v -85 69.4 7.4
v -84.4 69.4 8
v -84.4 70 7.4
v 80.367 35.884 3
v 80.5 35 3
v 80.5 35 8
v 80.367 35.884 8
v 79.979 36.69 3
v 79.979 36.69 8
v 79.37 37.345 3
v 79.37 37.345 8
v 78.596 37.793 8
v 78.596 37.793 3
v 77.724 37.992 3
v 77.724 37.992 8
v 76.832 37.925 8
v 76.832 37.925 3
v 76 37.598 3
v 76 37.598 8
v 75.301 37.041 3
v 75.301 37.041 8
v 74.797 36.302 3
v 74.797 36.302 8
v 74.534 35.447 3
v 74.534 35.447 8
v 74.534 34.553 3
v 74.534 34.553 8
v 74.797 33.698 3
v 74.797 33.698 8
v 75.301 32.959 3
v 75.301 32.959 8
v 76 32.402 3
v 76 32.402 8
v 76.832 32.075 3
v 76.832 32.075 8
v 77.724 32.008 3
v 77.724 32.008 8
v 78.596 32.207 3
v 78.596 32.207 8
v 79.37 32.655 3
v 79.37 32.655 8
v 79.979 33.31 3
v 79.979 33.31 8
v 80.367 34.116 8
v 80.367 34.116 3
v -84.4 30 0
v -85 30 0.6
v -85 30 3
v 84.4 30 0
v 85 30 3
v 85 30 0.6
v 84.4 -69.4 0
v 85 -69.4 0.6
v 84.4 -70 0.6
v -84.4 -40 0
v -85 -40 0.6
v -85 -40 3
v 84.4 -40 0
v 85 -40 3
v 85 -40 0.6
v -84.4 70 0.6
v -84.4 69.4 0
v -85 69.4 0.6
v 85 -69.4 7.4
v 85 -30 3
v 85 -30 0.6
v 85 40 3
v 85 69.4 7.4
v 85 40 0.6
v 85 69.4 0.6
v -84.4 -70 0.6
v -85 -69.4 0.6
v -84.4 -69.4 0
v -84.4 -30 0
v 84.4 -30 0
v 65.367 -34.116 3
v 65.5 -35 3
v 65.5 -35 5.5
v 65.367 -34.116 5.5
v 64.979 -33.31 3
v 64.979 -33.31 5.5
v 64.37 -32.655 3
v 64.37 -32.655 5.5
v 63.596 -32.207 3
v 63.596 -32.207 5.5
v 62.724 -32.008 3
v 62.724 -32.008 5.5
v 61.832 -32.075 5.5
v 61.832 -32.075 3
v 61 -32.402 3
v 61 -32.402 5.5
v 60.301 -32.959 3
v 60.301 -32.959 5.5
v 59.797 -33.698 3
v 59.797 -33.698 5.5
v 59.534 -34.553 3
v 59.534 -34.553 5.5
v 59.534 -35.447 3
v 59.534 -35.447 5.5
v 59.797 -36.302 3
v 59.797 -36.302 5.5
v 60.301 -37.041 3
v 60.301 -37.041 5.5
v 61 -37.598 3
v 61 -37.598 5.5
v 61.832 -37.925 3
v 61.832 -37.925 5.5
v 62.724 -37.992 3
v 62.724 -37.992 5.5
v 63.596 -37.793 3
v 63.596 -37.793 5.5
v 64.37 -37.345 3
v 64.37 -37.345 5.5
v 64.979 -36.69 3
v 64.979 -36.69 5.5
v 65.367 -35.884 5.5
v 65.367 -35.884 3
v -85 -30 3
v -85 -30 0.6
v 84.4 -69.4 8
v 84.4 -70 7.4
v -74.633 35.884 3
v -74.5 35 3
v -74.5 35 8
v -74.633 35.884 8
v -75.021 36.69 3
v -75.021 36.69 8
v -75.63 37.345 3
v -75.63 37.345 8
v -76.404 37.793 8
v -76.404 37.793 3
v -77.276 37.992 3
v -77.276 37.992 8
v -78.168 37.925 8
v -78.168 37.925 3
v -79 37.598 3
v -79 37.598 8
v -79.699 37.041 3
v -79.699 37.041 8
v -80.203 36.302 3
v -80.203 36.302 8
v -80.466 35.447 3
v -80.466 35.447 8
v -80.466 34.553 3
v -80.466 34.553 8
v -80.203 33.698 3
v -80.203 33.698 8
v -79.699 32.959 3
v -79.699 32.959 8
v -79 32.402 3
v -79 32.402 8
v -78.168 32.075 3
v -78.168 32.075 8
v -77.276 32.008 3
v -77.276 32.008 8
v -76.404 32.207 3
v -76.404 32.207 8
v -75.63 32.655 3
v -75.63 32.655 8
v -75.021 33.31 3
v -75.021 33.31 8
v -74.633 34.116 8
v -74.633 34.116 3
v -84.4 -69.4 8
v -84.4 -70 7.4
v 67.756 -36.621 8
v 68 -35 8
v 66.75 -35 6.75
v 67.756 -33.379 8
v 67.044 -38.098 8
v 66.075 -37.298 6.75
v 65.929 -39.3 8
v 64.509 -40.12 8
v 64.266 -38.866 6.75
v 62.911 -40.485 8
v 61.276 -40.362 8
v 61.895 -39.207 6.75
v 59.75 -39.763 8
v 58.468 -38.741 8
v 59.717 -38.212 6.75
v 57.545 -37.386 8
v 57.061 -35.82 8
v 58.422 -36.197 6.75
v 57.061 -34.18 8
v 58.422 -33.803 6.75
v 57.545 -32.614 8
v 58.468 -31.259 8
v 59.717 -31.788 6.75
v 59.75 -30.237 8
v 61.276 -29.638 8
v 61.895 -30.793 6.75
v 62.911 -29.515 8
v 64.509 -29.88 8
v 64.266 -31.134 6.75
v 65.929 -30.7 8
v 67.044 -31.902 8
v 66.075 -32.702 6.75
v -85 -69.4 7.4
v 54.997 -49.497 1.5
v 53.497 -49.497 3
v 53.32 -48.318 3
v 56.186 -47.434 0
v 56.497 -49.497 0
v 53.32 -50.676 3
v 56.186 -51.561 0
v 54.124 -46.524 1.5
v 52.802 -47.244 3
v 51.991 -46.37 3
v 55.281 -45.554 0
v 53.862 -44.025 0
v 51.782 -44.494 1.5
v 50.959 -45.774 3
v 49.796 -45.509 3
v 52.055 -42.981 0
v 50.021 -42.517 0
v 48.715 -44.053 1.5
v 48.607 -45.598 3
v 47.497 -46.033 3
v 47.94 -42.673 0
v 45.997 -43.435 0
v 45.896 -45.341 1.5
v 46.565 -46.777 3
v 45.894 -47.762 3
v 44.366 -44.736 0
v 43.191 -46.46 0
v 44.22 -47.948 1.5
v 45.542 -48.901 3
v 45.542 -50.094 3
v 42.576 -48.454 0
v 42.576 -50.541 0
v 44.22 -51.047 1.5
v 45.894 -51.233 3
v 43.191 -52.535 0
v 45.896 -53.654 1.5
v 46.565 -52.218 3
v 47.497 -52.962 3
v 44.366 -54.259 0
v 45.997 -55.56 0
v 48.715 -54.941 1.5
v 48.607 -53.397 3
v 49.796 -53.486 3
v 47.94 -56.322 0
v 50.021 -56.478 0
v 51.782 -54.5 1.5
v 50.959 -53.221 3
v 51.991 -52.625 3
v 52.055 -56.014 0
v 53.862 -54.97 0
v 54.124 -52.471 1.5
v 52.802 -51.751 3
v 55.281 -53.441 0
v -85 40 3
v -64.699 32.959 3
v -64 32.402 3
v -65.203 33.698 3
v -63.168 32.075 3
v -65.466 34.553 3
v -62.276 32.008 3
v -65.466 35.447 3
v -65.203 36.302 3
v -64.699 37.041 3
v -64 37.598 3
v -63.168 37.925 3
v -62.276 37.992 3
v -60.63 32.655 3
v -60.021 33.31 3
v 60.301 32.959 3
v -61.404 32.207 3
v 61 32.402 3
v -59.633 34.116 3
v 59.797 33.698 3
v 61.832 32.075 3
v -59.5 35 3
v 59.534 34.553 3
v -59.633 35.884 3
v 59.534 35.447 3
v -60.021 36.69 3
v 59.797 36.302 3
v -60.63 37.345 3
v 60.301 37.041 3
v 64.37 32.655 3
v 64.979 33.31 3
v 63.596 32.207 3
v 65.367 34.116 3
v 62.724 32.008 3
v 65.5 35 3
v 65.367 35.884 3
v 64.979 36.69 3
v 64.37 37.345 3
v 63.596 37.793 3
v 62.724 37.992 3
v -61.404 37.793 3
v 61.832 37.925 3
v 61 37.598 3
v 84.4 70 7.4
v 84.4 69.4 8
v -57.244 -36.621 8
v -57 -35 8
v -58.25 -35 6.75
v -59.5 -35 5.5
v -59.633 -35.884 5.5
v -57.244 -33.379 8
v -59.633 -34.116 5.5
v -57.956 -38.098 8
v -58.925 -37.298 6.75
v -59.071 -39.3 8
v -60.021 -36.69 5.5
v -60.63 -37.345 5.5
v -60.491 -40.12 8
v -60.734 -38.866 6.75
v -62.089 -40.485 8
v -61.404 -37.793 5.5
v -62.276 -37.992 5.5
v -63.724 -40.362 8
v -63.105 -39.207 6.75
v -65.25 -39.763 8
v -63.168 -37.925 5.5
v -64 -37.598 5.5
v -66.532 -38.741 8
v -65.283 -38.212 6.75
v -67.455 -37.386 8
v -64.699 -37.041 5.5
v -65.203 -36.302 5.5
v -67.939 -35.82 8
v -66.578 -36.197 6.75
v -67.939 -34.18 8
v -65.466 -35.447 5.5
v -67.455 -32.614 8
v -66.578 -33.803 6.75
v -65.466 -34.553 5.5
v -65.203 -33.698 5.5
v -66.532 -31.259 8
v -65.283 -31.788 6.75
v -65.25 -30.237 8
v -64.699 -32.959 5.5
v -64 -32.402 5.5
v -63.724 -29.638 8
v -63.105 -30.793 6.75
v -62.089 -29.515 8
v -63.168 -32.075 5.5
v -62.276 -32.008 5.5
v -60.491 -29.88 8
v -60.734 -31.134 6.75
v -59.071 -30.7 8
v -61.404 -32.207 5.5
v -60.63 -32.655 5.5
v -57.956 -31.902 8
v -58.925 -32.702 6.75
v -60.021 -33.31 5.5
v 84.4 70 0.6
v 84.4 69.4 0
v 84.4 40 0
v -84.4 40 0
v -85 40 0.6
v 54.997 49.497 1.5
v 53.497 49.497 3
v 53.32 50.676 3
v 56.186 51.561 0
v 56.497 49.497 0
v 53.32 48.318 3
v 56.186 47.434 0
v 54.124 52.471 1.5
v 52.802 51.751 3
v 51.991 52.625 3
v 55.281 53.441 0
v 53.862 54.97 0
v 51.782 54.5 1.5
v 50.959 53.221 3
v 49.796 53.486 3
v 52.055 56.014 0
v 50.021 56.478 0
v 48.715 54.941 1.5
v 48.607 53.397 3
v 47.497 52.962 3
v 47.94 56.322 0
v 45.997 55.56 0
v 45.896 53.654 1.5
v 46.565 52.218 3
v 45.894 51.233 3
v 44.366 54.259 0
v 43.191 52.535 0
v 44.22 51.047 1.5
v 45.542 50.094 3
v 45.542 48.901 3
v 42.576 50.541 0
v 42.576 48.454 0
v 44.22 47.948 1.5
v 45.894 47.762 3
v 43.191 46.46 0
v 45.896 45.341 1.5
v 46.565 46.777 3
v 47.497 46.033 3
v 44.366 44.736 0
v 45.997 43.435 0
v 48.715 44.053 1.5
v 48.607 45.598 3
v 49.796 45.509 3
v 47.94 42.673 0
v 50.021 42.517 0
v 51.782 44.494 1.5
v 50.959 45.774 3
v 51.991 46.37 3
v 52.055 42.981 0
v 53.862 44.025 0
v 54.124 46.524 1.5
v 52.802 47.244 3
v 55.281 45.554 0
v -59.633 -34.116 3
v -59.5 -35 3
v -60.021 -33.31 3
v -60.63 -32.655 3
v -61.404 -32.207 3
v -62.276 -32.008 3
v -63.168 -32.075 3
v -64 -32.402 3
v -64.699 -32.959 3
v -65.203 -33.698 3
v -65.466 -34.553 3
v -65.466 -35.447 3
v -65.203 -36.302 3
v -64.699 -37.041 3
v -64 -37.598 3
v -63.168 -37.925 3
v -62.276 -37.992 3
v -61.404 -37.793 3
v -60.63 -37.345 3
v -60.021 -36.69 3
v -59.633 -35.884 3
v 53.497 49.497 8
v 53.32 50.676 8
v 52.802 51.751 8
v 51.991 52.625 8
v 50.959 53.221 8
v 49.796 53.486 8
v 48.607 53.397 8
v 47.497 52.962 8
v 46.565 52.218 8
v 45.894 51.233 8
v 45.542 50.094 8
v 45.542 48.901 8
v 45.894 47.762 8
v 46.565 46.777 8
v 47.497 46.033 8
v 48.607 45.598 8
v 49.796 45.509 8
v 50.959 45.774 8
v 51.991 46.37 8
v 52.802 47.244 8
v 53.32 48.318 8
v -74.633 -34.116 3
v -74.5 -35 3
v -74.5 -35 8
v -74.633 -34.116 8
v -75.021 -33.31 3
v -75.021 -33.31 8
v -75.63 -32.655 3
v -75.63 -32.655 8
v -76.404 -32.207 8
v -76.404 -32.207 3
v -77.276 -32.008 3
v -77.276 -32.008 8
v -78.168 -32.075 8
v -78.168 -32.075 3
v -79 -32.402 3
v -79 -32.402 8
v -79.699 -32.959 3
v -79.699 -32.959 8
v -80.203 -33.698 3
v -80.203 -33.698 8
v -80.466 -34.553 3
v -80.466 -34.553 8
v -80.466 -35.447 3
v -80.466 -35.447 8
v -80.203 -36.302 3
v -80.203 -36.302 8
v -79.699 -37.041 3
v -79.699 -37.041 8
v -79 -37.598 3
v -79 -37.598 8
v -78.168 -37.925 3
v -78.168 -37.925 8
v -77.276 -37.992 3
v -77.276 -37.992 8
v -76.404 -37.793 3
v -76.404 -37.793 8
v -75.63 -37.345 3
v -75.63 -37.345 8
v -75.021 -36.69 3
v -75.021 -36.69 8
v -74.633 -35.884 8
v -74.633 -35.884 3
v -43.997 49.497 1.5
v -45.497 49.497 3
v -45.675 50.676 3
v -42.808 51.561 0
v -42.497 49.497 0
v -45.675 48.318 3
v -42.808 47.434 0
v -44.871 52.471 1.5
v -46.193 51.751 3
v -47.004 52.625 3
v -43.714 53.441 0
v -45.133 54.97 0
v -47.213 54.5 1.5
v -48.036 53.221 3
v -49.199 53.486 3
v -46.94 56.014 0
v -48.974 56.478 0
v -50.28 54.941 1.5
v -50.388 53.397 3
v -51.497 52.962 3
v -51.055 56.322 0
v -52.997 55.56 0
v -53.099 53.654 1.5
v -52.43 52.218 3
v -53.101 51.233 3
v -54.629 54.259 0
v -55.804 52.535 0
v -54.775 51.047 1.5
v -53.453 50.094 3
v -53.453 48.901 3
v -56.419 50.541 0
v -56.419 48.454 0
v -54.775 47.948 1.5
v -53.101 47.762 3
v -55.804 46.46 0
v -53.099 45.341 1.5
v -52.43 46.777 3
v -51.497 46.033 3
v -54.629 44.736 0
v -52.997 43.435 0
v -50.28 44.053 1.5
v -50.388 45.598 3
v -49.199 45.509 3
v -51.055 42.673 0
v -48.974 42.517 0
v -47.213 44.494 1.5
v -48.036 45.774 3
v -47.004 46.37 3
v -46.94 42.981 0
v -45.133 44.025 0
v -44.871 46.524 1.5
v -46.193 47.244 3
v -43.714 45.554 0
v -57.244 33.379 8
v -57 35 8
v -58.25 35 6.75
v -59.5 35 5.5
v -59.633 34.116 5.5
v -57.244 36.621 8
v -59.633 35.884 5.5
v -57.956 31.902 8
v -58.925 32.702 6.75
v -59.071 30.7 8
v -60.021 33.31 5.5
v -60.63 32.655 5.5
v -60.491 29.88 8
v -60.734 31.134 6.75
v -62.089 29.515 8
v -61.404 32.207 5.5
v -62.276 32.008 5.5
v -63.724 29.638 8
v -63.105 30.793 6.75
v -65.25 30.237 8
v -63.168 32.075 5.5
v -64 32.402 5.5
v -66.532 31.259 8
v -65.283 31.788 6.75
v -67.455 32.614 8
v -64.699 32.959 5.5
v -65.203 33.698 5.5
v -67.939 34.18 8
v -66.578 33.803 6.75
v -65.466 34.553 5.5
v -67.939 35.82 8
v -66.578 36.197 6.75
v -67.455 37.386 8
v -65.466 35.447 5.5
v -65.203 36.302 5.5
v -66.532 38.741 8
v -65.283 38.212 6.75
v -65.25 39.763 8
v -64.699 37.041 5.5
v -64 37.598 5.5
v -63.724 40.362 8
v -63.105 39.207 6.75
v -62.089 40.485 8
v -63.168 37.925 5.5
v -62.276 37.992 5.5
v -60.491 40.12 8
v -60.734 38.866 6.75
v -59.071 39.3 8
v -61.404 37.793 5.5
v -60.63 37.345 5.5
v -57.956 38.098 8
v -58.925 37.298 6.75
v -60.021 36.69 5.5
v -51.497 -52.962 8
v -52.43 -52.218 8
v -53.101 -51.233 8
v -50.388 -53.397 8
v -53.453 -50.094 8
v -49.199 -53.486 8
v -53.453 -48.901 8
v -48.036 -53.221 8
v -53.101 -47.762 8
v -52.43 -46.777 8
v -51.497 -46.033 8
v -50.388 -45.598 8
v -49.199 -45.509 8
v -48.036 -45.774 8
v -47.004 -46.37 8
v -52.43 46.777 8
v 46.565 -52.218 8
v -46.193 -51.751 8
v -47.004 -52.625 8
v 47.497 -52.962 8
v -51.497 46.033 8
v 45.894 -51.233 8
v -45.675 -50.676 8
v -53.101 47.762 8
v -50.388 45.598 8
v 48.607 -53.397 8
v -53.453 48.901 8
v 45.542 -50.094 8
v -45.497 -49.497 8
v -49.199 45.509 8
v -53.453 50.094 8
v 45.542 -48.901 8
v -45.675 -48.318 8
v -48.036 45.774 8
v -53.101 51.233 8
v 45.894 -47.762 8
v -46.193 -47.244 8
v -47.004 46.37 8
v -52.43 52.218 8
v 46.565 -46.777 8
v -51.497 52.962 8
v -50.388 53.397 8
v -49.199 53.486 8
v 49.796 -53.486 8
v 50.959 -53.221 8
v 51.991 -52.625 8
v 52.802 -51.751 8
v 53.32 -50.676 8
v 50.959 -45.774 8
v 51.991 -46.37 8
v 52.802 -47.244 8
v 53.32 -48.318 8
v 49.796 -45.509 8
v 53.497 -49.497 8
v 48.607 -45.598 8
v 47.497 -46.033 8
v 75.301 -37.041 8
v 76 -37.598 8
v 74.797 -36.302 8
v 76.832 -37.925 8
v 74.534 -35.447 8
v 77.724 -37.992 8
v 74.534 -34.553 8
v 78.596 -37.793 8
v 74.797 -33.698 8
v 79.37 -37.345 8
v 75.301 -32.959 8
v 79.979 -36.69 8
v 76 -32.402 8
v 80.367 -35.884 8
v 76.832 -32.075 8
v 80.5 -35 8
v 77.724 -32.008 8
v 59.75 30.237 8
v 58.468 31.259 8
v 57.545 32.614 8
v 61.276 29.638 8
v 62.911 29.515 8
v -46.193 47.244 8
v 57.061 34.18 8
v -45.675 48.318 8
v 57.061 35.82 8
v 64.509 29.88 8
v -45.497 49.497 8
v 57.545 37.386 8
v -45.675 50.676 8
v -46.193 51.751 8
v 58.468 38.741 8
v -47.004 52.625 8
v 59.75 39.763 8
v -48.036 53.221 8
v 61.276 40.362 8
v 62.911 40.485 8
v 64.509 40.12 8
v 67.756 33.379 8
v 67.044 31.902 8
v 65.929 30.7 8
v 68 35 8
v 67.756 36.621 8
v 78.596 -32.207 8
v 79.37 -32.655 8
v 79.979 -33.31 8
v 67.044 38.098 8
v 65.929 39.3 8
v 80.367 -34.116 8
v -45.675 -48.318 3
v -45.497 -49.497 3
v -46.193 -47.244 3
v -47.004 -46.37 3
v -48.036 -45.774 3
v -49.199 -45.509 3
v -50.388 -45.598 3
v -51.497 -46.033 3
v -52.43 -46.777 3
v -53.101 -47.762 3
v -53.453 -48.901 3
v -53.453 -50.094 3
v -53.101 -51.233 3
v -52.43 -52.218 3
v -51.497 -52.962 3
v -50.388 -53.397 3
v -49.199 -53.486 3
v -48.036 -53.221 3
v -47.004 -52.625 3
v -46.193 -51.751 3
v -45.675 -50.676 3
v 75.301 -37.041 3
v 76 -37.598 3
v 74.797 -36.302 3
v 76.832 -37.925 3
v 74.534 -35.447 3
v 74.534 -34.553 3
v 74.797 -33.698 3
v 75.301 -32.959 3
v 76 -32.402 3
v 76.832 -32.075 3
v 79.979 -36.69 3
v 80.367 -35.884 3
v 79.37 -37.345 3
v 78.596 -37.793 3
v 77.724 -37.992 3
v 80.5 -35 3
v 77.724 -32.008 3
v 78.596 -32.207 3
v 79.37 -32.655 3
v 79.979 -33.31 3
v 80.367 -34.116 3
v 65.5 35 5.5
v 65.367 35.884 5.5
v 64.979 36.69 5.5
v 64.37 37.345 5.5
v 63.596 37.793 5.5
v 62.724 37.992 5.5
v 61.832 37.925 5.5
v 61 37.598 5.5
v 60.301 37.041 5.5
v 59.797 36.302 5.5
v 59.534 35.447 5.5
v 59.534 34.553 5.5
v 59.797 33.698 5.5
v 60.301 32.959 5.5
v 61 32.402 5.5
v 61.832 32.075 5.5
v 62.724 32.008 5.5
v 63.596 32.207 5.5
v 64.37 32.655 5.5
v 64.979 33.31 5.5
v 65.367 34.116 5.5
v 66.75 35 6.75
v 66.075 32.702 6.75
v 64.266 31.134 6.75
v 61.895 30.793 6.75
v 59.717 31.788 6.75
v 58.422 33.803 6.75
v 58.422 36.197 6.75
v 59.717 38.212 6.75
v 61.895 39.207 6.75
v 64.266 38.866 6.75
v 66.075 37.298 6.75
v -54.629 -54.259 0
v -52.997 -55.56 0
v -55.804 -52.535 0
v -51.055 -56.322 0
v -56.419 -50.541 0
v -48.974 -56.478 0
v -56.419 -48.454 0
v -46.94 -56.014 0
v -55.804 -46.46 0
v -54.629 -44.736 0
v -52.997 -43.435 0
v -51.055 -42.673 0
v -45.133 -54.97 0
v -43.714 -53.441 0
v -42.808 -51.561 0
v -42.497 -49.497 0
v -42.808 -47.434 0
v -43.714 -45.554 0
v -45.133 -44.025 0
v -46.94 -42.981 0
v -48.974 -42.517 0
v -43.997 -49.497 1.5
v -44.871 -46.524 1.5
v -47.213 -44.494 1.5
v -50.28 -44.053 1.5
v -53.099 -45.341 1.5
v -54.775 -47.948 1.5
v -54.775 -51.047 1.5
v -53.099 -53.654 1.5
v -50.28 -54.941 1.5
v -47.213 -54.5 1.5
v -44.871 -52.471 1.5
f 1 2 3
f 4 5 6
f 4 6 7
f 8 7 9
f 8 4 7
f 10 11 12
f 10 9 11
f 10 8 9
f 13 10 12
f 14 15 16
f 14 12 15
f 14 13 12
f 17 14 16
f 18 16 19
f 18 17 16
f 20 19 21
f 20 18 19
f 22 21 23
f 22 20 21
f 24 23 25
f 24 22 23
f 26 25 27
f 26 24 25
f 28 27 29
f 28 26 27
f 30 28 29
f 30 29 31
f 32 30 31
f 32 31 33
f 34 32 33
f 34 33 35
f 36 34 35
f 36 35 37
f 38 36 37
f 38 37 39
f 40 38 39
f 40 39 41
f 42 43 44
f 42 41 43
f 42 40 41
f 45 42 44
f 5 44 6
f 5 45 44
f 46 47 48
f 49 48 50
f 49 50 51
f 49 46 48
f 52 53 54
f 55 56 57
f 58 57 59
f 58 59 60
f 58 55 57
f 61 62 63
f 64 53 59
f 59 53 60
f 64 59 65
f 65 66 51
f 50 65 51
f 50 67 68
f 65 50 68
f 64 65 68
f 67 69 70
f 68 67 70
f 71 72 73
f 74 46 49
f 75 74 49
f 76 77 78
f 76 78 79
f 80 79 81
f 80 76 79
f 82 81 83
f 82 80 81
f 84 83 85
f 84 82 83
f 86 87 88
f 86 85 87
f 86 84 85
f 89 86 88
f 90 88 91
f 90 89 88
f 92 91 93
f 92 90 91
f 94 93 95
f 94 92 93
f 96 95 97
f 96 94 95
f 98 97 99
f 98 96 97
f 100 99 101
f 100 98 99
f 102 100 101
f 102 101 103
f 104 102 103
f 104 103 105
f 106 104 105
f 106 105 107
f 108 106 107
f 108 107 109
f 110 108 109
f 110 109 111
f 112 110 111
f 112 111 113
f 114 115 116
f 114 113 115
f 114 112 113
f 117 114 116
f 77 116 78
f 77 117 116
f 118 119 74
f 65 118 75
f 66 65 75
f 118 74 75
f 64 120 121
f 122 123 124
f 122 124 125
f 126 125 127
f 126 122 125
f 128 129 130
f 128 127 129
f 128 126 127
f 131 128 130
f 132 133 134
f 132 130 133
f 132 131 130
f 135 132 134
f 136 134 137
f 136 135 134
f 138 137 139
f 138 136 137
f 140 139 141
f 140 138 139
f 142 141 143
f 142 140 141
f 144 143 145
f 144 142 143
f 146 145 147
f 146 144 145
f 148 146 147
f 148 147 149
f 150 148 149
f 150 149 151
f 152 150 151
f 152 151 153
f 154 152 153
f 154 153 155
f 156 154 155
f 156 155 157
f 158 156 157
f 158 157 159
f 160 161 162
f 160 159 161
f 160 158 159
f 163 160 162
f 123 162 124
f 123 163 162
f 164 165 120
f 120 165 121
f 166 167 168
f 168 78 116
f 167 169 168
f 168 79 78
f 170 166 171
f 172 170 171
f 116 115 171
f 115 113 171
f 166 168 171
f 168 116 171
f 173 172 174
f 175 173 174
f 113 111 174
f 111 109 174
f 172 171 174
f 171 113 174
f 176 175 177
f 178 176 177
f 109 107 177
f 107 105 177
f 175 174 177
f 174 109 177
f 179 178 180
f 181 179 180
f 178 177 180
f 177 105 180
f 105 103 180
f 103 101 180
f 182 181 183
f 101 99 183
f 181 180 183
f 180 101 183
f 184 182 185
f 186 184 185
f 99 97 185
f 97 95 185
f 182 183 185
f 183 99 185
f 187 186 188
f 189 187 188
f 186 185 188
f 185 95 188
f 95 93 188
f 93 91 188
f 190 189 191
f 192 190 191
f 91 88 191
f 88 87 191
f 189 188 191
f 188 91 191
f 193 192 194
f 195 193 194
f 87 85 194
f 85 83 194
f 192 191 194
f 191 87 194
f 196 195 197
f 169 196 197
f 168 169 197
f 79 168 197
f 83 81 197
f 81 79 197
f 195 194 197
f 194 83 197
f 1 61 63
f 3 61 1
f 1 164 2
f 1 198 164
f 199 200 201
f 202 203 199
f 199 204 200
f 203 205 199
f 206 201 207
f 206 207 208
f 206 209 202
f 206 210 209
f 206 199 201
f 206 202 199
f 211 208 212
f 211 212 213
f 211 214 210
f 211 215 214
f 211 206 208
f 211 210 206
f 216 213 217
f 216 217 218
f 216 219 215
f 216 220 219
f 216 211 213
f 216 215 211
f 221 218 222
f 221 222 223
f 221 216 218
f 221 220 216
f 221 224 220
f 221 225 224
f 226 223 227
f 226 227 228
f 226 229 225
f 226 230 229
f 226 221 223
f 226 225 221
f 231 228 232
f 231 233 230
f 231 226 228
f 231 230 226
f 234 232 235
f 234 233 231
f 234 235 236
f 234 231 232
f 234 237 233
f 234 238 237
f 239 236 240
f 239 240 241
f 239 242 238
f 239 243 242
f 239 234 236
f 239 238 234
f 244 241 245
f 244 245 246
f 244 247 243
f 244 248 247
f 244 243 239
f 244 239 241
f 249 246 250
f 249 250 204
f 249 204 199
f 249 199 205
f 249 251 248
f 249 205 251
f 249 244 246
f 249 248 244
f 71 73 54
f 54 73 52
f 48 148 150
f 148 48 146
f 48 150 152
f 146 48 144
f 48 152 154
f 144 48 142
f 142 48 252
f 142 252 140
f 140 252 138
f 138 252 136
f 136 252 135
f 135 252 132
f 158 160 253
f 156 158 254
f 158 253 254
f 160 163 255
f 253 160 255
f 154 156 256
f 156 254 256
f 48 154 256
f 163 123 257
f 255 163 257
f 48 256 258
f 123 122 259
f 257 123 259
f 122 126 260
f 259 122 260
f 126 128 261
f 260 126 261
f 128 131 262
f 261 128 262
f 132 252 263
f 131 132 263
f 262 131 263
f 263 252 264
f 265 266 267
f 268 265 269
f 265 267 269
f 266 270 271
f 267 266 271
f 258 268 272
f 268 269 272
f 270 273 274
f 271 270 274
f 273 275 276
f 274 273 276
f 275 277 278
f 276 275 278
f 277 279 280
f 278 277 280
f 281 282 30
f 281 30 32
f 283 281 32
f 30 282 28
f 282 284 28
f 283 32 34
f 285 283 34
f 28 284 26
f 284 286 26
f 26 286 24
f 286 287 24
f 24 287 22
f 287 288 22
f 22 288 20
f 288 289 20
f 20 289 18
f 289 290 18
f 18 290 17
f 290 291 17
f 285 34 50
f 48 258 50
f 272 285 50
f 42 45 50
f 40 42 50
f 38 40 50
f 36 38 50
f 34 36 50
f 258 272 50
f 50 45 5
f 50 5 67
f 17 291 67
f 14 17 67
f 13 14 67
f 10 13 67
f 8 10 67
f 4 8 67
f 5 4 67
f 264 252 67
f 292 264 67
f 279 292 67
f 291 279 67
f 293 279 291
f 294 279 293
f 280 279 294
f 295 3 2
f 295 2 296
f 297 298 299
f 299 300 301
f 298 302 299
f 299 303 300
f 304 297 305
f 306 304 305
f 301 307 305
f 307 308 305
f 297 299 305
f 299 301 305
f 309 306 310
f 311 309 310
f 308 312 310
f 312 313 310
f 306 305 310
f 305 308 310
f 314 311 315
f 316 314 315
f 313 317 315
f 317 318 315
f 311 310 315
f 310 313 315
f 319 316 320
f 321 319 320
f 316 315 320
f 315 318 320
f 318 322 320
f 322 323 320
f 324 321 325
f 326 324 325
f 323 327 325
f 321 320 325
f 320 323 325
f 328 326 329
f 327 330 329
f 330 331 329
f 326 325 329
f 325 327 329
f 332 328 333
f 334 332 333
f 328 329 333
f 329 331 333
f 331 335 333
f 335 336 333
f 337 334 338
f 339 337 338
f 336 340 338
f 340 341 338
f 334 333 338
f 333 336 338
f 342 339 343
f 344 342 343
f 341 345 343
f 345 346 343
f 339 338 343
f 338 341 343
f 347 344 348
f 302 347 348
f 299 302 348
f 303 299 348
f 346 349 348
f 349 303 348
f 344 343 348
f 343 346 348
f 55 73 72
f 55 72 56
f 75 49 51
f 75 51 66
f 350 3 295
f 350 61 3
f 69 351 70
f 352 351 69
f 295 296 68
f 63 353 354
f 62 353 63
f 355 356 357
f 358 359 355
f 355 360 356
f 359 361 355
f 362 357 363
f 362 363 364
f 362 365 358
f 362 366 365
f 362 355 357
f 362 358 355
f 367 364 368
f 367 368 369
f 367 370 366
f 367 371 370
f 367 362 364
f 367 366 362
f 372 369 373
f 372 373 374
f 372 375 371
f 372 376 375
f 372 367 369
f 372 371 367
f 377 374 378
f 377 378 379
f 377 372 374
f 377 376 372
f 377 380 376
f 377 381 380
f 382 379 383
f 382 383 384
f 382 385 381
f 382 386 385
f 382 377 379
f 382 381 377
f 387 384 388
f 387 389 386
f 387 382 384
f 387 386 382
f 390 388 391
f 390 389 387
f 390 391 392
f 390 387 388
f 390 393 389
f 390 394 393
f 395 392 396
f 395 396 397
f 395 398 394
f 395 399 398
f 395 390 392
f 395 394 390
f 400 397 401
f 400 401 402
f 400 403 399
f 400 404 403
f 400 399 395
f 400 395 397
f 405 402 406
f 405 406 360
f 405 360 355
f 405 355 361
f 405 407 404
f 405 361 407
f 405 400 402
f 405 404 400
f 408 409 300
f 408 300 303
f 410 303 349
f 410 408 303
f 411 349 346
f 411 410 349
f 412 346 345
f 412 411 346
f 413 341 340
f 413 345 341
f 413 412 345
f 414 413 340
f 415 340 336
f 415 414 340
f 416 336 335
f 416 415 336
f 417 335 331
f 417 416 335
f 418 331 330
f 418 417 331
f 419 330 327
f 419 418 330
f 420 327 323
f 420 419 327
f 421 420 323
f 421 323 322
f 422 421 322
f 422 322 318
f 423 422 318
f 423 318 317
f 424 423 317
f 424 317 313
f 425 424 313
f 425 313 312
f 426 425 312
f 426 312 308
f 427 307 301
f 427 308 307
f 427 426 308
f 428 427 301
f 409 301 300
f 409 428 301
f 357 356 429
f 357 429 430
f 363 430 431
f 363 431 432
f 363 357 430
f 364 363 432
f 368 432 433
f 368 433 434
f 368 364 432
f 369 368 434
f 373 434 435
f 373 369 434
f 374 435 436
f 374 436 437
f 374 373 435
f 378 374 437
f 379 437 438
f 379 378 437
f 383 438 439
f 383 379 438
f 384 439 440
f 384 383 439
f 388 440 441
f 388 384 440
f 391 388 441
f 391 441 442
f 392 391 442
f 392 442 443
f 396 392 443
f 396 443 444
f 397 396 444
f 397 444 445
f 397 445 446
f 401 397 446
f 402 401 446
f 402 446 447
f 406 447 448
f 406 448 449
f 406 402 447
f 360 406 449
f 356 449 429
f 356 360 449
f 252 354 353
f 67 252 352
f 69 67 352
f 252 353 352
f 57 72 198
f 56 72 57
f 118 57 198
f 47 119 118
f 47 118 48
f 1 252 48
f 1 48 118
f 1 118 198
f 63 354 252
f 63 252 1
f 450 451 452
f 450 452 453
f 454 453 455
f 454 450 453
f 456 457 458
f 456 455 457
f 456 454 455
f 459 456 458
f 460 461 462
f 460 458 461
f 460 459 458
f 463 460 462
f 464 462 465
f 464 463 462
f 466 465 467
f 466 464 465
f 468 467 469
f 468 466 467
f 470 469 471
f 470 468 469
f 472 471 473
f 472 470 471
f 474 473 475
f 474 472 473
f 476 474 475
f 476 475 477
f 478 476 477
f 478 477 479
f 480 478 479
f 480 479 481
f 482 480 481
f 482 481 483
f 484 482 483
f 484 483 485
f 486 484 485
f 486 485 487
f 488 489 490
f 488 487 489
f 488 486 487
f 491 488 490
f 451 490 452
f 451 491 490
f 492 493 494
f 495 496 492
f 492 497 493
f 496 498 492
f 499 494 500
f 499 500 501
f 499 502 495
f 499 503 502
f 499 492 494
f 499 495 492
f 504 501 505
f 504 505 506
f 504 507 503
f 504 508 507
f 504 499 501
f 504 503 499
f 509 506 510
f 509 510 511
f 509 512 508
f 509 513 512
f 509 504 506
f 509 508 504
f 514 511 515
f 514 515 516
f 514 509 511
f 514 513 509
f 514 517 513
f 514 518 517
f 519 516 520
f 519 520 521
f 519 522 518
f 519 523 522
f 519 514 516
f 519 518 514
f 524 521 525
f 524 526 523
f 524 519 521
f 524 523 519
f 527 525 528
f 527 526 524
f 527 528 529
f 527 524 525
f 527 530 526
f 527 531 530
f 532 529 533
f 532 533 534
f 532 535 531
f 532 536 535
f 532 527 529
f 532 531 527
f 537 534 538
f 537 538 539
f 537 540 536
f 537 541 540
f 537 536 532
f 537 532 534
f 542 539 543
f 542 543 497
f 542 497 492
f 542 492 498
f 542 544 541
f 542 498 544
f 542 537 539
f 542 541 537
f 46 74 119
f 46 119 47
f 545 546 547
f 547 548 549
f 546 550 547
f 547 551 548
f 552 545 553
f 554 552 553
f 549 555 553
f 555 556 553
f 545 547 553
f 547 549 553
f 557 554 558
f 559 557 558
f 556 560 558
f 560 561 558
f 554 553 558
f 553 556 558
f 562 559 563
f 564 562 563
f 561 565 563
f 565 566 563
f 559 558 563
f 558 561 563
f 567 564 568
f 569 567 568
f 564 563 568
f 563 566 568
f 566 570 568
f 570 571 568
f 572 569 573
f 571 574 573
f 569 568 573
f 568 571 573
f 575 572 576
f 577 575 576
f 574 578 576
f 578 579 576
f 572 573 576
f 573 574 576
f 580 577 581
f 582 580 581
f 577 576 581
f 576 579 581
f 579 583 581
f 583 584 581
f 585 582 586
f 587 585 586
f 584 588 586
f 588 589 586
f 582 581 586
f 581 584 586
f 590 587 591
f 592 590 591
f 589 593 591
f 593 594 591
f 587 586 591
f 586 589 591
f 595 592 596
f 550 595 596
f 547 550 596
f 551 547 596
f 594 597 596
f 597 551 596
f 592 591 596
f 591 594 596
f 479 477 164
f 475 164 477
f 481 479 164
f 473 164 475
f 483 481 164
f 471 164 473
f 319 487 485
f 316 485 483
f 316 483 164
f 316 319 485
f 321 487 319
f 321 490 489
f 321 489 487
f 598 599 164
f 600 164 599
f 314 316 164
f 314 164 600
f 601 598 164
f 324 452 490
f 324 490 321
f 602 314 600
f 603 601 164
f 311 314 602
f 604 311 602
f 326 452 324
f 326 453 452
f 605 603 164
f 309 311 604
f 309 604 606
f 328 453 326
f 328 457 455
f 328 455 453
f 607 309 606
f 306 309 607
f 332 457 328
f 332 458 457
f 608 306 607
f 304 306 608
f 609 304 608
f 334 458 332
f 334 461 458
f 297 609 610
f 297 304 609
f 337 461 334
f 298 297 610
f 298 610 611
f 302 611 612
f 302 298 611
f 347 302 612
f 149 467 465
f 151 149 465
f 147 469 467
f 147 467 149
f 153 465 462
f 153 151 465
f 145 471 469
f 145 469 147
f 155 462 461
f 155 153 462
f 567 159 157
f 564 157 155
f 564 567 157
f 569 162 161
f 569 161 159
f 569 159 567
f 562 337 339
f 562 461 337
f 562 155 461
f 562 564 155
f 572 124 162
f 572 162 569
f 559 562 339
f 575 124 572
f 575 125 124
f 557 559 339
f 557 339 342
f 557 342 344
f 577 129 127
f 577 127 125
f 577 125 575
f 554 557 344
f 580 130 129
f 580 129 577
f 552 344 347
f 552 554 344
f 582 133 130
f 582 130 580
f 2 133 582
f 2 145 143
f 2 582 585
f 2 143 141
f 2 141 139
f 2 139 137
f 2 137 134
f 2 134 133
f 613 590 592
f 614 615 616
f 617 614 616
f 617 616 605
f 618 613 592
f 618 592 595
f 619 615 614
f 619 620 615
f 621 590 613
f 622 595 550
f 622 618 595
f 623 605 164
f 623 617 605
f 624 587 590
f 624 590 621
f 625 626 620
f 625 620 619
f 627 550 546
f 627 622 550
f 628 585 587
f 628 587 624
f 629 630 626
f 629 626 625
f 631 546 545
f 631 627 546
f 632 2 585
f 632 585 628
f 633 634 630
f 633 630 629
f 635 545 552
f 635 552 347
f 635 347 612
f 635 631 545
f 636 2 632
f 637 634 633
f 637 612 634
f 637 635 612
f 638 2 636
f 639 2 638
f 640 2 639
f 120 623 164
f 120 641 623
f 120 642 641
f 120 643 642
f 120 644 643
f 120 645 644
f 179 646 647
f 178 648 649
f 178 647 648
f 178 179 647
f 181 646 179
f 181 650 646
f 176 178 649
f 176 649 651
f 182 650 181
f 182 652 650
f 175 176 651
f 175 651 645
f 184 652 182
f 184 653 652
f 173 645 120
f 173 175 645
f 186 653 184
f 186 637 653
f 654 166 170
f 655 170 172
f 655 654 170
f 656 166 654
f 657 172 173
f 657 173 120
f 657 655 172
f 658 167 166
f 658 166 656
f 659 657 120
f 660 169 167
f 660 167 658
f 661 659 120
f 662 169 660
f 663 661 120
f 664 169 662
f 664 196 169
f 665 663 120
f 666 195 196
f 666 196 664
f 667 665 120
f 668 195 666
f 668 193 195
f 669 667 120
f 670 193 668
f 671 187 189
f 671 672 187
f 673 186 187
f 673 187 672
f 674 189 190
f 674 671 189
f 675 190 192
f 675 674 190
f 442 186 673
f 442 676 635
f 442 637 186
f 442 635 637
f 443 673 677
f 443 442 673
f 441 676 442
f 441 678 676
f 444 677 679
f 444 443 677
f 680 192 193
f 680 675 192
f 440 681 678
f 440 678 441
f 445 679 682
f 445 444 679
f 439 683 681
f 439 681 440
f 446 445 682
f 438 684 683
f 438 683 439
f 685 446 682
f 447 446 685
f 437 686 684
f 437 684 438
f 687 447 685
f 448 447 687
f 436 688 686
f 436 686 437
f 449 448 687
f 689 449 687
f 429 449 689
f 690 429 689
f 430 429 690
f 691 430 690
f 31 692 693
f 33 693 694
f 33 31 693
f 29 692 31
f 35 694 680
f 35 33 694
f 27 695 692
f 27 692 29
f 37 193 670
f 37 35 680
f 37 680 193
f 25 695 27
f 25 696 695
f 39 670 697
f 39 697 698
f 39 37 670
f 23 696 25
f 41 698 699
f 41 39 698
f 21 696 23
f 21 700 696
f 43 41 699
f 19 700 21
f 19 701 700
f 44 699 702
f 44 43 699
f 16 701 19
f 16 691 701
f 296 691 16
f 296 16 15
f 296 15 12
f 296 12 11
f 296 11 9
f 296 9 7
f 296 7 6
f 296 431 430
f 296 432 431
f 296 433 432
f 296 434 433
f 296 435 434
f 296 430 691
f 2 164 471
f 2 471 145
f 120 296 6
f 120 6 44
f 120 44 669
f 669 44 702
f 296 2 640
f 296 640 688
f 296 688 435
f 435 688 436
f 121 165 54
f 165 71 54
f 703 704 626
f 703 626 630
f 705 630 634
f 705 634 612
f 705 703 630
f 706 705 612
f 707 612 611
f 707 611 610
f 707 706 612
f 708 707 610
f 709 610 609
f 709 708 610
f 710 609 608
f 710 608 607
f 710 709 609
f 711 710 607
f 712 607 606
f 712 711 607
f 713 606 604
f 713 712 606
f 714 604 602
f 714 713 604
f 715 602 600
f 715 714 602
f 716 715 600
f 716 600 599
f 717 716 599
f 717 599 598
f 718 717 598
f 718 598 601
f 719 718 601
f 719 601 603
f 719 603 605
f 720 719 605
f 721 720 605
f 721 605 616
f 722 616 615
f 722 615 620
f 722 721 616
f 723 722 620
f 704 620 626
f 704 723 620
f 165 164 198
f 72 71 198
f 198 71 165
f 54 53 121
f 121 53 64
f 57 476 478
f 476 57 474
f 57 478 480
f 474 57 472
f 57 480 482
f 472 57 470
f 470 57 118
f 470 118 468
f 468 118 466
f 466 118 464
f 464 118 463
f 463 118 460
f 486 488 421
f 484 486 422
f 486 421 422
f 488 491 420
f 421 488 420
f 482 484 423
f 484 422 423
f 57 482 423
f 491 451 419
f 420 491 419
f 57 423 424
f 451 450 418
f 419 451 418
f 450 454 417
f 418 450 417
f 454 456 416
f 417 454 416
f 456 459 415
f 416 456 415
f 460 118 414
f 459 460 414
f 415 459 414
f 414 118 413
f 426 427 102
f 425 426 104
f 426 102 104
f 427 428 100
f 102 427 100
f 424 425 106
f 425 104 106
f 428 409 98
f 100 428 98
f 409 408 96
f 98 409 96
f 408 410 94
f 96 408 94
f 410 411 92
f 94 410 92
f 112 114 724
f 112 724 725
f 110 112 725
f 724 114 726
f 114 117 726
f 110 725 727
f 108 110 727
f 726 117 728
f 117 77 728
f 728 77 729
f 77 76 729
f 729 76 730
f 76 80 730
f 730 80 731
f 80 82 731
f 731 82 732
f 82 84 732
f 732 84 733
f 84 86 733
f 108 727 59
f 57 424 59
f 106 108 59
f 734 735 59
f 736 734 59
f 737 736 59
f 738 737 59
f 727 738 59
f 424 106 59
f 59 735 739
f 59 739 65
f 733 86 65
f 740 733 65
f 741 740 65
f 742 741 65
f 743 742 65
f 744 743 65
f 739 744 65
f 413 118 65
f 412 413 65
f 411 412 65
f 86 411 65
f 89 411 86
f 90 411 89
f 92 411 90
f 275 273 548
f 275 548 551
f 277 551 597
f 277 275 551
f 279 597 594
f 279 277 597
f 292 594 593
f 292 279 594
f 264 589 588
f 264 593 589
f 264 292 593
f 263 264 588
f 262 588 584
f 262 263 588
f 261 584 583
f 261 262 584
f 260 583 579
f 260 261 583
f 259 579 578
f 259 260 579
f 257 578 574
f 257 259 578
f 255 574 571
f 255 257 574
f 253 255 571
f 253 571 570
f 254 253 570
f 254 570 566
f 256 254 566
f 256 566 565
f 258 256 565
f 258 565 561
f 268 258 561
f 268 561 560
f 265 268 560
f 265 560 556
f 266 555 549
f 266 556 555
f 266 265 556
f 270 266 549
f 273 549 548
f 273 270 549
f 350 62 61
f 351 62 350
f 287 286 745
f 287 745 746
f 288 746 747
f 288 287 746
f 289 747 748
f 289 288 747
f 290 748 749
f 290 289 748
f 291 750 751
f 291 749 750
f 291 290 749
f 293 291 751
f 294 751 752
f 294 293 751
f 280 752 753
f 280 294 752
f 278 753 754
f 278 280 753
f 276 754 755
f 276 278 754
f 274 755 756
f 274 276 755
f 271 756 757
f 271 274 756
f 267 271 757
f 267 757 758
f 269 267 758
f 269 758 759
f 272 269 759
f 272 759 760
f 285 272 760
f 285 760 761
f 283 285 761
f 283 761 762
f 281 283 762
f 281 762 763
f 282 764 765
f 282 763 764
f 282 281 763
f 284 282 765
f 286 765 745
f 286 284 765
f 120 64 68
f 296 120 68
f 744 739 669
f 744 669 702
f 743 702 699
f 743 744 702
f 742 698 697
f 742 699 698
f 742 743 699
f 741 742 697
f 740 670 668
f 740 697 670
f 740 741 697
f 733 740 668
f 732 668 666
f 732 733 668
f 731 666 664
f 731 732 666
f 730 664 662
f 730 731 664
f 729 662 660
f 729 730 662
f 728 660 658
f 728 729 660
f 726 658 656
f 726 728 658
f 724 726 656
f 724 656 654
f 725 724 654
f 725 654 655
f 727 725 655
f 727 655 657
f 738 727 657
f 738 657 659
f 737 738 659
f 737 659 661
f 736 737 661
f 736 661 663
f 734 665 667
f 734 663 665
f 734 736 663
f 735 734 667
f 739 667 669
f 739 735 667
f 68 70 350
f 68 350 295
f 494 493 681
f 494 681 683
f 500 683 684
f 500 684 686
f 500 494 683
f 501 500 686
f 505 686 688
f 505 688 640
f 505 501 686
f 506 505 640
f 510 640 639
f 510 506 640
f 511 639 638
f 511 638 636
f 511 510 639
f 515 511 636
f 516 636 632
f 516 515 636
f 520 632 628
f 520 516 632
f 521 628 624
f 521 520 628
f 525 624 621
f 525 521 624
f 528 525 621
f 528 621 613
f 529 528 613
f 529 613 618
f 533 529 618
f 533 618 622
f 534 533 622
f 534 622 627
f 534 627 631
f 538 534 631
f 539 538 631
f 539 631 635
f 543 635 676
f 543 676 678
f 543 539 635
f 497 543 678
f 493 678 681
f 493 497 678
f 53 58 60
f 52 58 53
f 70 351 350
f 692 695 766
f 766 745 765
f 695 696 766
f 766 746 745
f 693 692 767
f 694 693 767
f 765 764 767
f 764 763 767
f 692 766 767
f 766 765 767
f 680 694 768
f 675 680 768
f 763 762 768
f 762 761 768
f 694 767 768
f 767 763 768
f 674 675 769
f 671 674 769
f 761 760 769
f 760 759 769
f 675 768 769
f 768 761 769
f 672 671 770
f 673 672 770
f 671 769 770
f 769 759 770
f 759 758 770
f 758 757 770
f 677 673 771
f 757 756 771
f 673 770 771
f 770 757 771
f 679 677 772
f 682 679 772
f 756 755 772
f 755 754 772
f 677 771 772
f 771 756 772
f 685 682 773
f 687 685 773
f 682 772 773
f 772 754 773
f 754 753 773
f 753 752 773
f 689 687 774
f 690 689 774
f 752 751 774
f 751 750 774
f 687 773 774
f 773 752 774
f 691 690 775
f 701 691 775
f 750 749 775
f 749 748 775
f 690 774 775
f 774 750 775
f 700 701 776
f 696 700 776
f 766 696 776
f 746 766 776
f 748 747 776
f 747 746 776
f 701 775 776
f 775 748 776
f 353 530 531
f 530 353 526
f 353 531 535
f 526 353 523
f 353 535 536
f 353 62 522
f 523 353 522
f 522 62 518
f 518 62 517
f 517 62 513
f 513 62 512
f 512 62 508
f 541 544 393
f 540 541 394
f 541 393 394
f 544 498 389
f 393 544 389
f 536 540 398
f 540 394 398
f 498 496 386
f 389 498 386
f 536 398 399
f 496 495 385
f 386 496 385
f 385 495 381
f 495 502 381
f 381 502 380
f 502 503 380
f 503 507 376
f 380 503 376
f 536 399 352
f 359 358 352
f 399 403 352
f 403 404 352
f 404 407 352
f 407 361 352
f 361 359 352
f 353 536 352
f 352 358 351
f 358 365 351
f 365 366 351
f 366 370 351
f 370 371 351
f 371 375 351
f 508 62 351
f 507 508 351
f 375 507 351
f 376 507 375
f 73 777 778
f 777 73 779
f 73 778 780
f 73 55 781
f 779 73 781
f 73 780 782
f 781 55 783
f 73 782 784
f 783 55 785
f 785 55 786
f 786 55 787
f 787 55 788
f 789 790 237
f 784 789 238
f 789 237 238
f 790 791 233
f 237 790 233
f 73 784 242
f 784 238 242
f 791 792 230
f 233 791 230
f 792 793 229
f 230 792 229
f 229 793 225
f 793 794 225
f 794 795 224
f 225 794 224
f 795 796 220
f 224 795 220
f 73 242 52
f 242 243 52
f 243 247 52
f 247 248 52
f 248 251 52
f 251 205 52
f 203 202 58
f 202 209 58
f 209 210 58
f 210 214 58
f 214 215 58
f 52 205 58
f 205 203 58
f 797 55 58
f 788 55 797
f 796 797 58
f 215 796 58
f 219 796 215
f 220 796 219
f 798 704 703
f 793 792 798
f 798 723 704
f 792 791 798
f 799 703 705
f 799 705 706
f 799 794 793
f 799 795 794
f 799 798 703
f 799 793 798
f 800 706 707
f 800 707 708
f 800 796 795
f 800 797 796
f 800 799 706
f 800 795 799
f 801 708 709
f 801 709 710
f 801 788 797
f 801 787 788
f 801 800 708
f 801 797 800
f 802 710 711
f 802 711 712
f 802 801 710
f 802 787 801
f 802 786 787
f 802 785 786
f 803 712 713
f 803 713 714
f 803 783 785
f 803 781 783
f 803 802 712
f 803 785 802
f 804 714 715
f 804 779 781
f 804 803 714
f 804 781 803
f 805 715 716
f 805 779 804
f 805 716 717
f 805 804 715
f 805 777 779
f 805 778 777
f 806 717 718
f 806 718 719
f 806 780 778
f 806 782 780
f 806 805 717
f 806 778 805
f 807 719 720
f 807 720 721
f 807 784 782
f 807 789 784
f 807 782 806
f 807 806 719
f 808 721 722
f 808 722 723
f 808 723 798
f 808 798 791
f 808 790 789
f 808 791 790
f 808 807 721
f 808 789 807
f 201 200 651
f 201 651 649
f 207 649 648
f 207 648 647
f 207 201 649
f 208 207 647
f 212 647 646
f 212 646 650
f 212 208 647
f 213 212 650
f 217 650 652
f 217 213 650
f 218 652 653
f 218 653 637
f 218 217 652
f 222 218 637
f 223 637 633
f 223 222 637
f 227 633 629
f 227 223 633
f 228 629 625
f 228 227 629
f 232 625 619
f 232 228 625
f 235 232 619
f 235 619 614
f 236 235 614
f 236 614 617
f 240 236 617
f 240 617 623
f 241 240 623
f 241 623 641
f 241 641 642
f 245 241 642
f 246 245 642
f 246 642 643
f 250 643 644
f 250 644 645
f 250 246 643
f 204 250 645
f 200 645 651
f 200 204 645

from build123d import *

# Parameters (mm, degrees)
F0_W          = 170
F0_H          = 140
F0_R          = 4
F1_DEPTH      = 8
F2_SIZE       = 3
F3_W          = 180
F3_H          = 10
F4_DEPTH      = 25
F4_DEPTH_BACK = 3
F5_R          = 3
F6_DEPTH      = 25
F7_SIZE       = 2.5
F8_SIZE       = 0.6


with BuildPart() as f1:
    # F0 (on Top) → F1 (new body)
    with BuildSketch(Plane.XY):
        Rectangle(F0_W, F0_H)
        with Locations((-49.4974746831, -49.4974746831)):
            Circle(F0_R, mode=Mode.SUBTRACT)
        with Locations((49.4974746831, -49.4974746831)):
            Circle(F0_R, mode=Mode.SUBTRACT)
        with Locations((-49.4974746831, 49.4974746831)):
            Circle(F0_R, mode=Mode.SUBTRACT)
        with Locations((49.4974746831, 49.4974746831)):
            Circle(F0_R, mode=Mode.SUBTRACT)
    extrude(amount=F1_DEPTH)

    # F2
    f2_edges = [f1.edges().sort_by_distance(p)[0] for p in [
        (-53.497475, -49.497475, 0),
        (-53.497475, 49.497475, 0),
        (45.497475, 49.497475, 0),
        (45.497475, -49.497475, 0),
    ]]
    chamfer(f2_edges, length=F2_SIZE)

    # F3 (on Top) → F4 (cut, two sides)
    with BuildSketch(Plane.XY) as f4_sk:
        with Locations((0, -35)):
            Rectangle(F3_W, F3_H)
        with Locations((0, 35)):
            Rectangle(F3_W, F3_H)
    extrude(amount=-F4_DEPTH, mode=Mode.SUBTRACT)
    extrude(f4_sk.sketch, amount=F4_DEPTH_BACK, mode=Mode.SUBTRACT)

    # F5 (on Top) → F6 (cut)
    with BuildSketch(Plane.XY):
        with Locations((-62.5, -35)):
            Circle(F5_R)
        with Locations((-77.5, -35)):
            Circle(F5_R)
        with Locations((-62.5, 35)):
            Circle(F5_R)
        with Locations((-77.5, 35)):
            Circle(F5_R)
        with Locations((62.5, 35)):
            Circle(F5_R)
        with Locations((77.5, 35)):
            Circle(F5_R)
        with Locations((62.5, -35)):
            Circle(F5_R)
        with Locations((77.5, -35)):
            Circle(F5_R)
    extrude(amount=F6_DEPTH, mode=Mode.SUBTRACT)

    # F7
    f7_edges = [f1.edges().sort_by_distance(p)[0] for p in [
        (-65.5, 35, 8),
        (-65.5, -35, 8),
        (59.5, -35, 8),
        (59.5, 35, 8),
    ]]
    chamfer(f7_edges, length=F7_SIZE)

    # F8
    f8_edges = [f1.edges().sort_by_distance(p)[0] for p in [
        (-85, 0, 8),
        (0, 70, 8),
        (0, -70, 8),
        (85, 0, 8),
        (85, -70, 4),
        (-85, -70, 4),
        (85, 55, 0),
        (-85, 55, 0),
        (0, 70, 0),
        (-85, 0, 0),
        (-85, -55, 0),
        (85, 0, 0),
        (85, -55, 0),
        (0, -70, 0),
        (85, 70, 4),
        (-85, 70, 4),
    ]]
    chamfer(f8_edges, length=F8_SIZE)


solid = f1.part
